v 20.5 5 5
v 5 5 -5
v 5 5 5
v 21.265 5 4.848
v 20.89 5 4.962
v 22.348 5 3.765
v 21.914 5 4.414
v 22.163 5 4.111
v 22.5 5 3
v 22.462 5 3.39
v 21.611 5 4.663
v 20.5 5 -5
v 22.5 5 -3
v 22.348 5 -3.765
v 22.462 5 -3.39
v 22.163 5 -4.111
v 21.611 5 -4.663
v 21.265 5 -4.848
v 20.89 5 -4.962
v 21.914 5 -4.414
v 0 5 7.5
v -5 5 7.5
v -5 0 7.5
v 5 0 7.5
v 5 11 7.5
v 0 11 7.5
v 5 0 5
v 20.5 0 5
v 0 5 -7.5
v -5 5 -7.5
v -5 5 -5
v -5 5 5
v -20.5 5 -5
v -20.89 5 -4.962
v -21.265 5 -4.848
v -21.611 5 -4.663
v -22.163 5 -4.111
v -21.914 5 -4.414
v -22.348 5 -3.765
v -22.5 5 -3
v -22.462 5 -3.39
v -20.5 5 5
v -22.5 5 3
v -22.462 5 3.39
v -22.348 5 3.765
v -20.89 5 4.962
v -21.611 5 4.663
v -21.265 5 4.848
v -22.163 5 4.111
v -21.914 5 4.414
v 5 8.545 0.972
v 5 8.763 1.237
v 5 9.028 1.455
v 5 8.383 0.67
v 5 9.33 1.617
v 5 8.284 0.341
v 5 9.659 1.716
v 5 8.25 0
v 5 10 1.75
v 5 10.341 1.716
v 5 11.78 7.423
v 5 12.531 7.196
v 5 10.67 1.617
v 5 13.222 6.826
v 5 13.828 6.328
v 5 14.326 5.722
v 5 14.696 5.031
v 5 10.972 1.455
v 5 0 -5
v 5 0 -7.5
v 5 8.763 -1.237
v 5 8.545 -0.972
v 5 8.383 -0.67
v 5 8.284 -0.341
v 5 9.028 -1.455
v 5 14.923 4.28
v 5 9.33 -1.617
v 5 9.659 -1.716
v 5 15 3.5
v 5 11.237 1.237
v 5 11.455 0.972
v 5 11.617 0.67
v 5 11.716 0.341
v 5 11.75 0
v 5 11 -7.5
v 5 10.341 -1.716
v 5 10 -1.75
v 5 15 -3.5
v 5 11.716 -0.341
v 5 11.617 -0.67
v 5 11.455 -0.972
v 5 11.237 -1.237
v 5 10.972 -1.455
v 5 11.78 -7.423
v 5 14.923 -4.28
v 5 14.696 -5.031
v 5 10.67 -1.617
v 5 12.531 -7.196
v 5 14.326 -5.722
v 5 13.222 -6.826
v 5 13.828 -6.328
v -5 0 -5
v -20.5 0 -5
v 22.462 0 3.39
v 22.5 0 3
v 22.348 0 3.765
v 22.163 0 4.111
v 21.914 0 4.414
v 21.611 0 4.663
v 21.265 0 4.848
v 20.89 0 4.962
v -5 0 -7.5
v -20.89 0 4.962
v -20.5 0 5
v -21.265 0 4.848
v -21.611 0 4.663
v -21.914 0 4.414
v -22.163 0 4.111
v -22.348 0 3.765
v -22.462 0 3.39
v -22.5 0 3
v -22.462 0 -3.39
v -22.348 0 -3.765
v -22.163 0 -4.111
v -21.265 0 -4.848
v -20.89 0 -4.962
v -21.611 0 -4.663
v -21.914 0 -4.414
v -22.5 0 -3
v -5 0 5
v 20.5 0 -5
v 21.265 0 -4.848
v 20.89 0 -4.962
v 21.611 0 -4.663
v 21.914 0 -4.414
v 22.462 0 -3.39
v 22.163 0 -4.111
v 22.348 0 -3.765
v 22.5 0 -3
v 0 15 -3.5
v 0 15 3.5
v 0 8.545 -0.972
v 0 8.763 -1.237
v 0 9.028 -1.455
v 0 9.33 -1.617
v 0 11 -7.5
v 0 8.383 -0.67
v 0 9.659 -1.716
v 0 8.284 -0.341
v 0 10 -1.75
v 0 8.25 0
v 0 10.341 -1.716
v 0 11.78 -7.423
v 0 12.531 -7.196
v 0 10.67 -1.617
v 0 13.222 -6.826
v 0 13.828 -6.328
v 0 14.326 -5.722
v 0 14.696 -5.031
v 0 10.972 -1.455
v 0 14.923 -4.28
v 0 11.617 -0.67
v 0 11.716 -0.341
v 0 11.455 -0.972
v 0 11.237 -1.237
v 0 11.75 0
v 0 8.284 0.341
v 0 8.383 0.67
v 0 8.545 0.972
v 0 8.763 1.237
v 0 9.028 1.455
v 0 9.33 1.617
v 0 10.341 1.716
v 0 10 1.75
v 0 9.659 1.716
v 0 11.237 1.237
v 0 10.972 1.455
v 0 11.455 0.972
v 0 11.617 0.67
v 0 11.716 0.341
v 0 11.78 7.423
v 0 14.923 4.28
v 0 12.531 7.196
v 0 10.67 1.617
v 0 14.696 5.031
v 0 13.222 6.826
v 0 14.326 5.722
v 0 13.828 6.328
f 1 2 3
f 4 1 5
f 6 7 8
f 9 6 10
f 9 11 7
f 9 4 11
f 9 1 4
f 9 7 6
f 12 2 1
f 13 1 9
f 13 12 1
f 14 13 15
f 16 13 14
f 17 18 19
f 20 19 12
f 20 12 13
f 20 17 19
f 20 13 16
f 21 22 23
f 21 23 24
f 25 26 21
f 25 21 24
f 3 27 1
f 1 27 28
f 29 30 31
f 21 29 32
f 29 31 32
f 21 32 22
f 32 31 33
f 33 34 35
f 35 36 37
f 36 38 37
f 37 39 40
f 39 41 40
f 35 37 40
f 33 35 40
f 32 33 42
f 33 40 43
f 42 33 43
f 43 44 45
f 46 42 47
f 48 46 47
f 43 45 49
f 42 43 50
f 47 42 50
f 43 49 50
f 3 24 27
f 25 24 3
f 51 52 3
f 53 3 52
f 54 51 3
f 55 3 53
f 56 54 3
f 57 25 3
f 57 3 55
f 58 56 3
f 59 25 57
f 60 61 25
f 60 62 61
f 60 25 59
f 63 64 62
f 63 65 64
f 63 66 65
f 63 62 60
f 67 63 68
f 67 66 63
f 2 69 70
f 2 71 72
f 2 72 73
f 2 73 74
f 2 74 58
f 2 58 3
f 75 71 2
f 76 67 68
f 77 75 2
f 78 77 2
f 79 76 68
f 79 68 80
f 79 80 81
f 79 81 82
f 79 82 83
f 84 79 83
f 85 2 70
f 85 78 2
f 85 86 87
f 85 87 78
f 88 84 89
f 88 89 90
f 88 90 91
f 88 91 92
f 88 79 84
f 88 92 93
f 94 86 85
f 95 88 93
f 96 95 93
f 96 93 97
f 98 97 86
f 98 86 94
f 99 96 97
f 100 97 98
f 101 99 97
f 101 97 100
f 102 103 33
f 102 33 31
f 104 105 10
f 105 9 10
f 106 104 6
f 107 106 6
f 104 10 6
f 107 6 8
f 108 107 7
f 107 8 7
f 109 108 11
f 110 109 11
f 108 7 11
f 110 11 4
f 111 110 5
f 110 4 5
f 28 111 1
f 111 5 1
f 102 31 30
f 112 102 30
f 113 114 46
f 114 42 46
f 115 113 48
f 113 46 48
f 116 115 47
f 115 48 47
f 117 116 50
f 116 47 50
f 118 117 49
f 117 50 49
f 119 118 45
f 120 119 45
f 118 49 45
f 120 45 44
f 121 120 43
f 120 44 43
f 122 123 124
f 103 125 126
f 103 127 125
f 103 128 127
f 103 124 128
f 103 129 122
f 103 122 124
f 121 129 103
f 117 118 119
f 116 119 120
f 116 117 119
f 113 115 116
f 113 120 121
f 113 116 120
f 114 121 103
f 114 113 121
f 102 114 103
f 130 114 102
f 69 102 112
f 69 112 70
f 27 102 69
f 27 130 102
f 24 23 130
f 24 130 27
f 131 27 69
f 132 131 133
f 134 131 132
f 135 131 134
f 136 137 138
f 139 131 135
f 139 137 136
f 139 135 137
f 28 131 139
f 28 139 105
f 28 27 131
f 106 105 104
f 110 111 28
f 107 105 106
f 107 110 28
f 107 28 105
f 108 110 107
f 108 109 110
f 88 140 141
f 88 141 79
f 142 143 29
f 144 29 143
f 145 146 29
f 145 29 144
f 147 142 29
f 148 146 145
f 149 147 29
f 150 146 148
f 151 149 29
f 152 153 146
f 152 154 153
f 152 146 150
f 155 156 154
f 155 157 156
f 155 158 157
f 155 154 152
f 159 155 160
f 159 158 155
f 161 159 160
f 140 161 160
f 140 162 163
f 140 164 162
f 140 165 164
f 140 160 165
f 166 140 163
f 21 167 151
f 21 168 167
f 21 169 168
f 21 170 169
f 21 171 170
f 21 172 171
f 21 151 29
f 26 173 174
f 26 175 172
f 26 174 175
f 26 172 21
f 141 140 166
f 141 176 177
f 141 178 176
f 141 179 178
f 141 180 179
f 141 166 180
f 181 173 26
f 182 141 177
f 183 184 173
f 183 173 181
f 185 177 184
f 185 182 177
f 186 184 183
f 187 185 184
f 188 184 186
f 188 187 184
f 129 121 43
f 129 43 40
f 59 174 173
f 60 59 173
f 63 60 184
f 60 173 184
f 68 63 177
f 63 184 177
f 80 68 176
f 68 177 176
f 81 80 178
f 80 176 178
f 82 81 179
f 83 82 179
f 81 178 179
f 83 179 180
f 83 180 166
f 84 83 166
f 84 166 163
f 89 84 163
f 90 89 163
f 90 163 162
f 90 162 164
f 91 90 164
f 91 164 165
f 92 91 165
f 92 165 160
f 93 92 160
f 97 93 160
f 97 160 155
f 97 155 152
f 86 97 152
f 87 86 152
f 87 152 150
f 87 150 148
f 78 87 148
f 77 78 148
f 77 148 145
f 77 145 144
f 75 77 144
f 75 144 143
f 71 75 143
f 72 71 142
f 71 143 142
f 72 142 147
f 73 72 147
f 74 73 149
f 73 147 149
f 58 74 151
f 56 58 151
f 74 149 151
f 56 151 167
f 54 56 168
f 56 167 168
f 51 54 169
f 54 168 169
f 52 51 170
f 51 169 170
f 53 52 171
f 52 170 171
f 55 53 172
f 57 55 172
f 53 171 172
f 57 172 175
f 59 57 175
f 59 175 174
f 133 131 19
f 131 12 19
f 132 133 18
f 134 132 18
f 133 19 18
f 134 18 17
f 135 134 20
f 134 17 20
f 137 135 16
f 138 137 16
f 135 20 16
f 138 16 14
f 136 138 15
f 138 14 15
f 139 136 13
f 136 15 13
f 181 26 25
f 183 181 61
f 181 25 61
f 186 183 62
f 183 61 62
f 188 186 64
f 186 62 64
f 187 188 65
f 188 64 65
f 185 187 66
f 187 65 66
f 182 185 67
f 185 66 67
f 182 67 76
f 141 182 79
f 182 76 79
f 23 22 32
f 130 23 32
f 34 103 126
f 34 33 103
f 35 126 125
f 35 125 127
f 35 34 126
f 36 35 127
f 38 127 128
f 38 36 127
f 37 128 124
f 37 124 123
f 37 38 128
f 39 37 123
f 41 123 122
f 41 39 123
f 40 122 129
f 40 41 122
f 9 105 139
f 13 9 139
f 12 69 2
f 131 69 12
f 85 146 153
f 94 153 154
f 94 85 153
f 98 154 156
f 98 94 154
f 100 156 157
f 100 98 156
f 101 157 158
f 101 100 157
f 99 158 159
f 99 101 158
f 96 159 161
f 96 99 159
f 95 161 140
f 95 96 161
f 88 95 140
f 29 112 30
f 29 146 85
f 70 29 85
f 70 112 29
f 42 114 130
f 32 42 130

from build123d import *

# Parameters (mm, degrees)
SKETCH_3_W                  = 45
SKETCH_3_H                  = 10
EXTRUDE_2_DEPTH             = 5
SKETCH_4_W                  = 10
SKETCH_4_H                  = 15
EXTRUDE_3_DEPTH             = 10
EXTRUDE_3_DIRECTION_2_REACH = 25.585
SKETCH_5_R                  = 1.75
CUT_EXTRUDE_1_DEPTH         = 10
FILLET_2_R                  = 2
FILLET_1_R                  = 4
SKETCH_8_W                  = 20
SKETCH_8_H                  = 10
CUT_EXTRUDE_2_DEPTH         = 5


with BuildPart() as part:
    # 草图3 → 凸台-拉伸2 (new body)
    with BuildSketch(Plane(origin=(0, 0, 0), x_dir=(1, 0, 0), z_dir=(0, 1, 0))):
        Rectangle(SKETCH_3_W, SKETCH_3_H)
    extrude(amount=EXTRUDE_2_DEPTH)

    # 草图4 → 凸台-拉伸3 (add)
    with BuildSketch(Plane(origin=(0, 5, 0), x_dir=(1, 0, 0), z_dir=(0, 1, 0))):
        Rectangle(SKETCH_4_W, SKETCH_4_H)
    extrude(amount=EXTRUDE_3_DEPTH)

    # 凸台-拉伸3 direction 2: up to this face of the body (flat: up to its plane)
    extrude_3_direction_2_end = Plane(part.part.faces().sort_by_distance((0, 0, 0))[0])
    # 草图4 → 凸台-拉伸3 direction 2 (add, up to the picked face)
    with BuildSketch(Plane(origin=(0, 5, 0), x_dir=(1, 0, 0), z_dir=(0, 1, 0)), mode=Mode.PRIVATE) as extrude_3_direction_2_sk1:
        Rectangle(SKETCH_4_W, SKETCH_4_H)
    extrude_3_direction_2_tool1 = split(extrude(extrude_3_direction_2_sk1.sketch, amount=-EXTRUDE_3_DIRECTION_2_REACH, mode=Mode.PRIVATE), bisect_by=extrude_3_direction_2_end, keep=Keep.BOTH, mode=Mode.PRIVATE)
    add(extrude_3_direction_2_tool1.solids().sort_by(Axis((0, 5, 0), (0, -1, 0)))[0])

    # 草图5 → 切除-拉伸1 (cut)
    with BuildSketch(Plane.ZY.offset(5)):
        with Locations((0, 10)):
            Circle(SKETCH_5_R)
    extrude(amount=-CUT_EXTRUDE_1_DEPTH, mode=Mode.SUBTRACT)

    # 圆角2
    fillet_2_edges = [part.edges().sort_by_distance(p)[0] for p in [
        (22.5, 2.5, 5),
        (-22.5, 2.5, 5),
        (-22.5, 2.5, -5),
        (22.5, 2.5, -5),
    ]]
    fillet(fillet_2_edges, radius=FILLET_2_R)

    # 圆角1
    fillet_1_edges = [part.edges().sort_by_distance(p)[0] for p in [
        (0, 15, -7.5),
        (0, 15, 7.5),
    ]]
    fillet(fillet_1_edges, radius=FILLET_1_R)

    # 草图8 → 切除-拉伸2 (cut)
    with BuildSketch(Plane.ZY.offset(5)):
        with Locations((0, 10)):
            Rectangle(SKETCH_8_W, SKETCH_8_H)
    extrude(amount=-CUT_EXTRUDE_2_DEPTH, mode=Mode.SUBTRACT)


solid = part.part
